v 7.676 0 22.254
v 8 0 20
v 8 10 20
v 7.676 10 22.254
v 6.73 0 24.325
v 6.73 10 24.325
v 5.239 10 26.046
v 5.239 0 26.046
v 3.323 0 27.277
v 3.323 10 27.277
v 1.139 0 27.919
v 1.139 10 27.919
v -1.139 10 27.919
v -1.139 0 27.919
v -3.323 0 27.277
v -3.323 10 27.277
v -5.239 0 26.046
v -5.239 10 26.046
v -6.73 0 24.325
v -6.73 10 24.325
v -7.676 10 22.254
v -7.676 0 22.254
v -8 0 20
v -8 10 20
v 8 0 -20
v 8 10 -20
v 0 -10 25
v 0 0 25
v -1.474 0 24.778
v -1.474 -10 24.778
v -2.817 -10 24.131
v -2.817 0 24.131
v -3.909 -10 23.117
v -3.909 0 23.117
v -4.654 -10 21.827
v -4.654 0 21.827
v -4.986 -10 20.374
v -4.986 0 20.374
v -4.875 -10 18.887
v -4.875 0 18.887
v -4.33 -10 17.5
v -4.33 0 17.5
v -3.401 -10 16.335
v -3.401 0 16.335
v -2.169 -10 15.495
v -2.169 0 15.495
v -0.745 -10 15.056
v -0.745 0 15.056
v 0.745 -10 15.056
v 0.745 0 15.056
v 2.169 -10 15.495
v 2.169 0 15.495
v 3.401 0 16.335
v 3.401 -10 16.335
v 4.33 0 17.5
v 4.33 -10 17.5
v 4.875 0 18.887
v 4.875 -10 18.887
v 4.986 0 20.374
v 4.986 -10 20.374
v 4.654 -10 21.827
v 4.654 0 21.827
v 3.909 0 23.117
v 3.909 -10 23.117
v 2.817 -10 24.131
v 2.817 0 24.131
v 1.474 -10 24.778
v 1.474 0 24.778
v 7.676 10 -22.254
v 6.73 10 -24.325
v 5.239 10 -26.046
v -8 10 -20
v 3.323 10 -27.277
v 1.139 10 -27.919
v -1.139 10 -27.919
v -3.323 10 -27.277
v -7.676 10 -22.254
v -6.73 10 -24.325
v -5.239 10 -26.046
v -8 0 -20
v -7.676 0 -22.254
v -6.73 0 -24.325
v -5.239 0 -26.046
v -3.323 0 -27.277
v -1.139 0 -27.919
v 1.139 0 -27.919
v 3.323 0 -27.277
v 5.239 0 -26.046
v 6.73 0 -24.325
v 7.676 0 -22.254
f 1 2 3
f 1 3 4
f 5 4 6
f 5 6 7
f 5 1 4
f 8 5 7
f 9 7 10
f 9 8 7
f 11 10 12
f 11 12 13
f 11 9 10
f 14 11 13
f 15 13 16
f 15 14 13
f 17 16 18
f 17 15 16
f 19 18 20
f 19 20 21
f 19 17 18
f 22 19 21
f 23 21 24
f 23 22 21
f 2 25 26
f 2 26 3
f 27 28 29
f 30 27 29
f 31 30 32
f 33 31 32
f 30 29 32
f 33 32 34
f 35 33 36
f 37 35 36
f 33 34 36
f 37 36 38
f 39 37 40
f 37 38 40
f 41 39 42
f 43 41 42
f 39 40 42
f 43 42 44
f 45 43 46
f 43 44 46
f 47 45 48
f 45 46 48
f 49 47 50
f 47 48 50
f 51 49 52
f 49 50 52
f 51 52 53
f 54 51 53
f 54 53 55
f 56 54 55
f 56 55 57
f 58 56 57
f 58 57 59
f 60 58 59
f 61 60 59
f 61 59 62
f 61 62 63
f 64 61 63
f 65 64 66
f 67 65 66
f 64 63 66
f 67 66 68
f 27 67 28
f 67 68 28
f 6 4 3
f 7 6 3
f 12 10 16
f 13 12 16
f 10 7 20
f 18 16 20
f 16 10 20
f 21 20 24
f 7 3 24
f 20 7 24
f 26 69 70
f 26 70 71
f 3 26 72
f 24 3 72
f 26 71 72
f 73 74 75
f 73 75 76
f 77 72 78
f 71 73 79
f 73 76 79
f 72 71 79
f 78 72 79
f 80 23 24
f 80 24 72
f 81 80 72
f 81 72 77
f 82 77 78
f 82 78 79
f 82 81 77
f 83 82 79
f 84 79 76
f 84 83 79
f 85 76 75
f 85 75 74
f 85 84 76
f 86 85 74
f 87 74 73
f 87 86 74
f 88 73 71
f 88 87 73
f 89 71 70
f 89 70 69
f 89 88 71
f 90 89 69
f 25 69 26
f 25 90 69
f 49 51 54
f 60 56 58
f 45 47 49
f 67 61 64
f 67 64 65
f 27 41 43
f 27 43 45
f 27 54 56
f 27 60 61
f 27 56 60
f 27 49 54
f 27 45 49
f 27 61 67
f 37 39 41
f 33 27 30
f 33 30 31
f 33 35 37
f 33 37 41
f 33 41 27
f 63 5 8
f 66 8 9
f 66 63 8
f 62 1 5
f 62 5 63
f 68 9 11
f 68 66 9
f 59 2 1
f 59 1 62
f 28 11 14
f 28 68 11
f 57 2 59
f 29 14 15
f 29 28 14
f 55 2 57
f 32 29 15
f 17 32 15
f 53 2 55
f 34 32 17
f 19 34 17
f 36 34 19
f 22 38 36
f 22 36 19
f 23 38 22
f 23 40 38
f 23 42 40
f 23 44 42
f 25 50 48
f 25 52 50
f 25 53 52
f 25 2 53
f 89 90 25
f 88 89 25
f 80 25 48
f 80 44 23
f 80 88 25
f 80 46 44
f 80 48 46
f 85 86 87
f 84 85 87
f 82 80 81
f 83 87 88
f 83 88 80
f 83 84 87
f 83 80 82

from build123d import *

# Parameters (mm, degrees)
BOSS_EXTRUDE1_DEPTH = 10
SKETCH2_R           = 5
BOSS_EXTRUDE2_DEPTH = 10


with BuildPart() as part:
    # Sketch1 → Boss-Extrude1 (new body)
    with BuildSketch(Plane(origin=(0, 0, 0), x_dir=(1, 0, 0), z_dir=(0, 1, 0))):
        with BuildLine():
            Line((8, 20), (8, -20))
            ThreePointArc((8, -20), (0, -28), (-8, -20))
            Line((-8, -20), (-8, 20))
            ThreePointArc((-8, 20), (0, 28), (8, 20))
        make_face()
    extrude(amount=BOSS_EXTRUDE1_DEPTH)

    # Sketch2 → Boss-Extrude2 (add)
    with BuildSketch(Plane.XZ):
        with Locations(Location((0, 20, 0), (0, 0, 90))):
            Circle(SKETCH2_R)
    extrude(amount=BOSS_EXTRUDE2_DEPTH)


solid = part.part
